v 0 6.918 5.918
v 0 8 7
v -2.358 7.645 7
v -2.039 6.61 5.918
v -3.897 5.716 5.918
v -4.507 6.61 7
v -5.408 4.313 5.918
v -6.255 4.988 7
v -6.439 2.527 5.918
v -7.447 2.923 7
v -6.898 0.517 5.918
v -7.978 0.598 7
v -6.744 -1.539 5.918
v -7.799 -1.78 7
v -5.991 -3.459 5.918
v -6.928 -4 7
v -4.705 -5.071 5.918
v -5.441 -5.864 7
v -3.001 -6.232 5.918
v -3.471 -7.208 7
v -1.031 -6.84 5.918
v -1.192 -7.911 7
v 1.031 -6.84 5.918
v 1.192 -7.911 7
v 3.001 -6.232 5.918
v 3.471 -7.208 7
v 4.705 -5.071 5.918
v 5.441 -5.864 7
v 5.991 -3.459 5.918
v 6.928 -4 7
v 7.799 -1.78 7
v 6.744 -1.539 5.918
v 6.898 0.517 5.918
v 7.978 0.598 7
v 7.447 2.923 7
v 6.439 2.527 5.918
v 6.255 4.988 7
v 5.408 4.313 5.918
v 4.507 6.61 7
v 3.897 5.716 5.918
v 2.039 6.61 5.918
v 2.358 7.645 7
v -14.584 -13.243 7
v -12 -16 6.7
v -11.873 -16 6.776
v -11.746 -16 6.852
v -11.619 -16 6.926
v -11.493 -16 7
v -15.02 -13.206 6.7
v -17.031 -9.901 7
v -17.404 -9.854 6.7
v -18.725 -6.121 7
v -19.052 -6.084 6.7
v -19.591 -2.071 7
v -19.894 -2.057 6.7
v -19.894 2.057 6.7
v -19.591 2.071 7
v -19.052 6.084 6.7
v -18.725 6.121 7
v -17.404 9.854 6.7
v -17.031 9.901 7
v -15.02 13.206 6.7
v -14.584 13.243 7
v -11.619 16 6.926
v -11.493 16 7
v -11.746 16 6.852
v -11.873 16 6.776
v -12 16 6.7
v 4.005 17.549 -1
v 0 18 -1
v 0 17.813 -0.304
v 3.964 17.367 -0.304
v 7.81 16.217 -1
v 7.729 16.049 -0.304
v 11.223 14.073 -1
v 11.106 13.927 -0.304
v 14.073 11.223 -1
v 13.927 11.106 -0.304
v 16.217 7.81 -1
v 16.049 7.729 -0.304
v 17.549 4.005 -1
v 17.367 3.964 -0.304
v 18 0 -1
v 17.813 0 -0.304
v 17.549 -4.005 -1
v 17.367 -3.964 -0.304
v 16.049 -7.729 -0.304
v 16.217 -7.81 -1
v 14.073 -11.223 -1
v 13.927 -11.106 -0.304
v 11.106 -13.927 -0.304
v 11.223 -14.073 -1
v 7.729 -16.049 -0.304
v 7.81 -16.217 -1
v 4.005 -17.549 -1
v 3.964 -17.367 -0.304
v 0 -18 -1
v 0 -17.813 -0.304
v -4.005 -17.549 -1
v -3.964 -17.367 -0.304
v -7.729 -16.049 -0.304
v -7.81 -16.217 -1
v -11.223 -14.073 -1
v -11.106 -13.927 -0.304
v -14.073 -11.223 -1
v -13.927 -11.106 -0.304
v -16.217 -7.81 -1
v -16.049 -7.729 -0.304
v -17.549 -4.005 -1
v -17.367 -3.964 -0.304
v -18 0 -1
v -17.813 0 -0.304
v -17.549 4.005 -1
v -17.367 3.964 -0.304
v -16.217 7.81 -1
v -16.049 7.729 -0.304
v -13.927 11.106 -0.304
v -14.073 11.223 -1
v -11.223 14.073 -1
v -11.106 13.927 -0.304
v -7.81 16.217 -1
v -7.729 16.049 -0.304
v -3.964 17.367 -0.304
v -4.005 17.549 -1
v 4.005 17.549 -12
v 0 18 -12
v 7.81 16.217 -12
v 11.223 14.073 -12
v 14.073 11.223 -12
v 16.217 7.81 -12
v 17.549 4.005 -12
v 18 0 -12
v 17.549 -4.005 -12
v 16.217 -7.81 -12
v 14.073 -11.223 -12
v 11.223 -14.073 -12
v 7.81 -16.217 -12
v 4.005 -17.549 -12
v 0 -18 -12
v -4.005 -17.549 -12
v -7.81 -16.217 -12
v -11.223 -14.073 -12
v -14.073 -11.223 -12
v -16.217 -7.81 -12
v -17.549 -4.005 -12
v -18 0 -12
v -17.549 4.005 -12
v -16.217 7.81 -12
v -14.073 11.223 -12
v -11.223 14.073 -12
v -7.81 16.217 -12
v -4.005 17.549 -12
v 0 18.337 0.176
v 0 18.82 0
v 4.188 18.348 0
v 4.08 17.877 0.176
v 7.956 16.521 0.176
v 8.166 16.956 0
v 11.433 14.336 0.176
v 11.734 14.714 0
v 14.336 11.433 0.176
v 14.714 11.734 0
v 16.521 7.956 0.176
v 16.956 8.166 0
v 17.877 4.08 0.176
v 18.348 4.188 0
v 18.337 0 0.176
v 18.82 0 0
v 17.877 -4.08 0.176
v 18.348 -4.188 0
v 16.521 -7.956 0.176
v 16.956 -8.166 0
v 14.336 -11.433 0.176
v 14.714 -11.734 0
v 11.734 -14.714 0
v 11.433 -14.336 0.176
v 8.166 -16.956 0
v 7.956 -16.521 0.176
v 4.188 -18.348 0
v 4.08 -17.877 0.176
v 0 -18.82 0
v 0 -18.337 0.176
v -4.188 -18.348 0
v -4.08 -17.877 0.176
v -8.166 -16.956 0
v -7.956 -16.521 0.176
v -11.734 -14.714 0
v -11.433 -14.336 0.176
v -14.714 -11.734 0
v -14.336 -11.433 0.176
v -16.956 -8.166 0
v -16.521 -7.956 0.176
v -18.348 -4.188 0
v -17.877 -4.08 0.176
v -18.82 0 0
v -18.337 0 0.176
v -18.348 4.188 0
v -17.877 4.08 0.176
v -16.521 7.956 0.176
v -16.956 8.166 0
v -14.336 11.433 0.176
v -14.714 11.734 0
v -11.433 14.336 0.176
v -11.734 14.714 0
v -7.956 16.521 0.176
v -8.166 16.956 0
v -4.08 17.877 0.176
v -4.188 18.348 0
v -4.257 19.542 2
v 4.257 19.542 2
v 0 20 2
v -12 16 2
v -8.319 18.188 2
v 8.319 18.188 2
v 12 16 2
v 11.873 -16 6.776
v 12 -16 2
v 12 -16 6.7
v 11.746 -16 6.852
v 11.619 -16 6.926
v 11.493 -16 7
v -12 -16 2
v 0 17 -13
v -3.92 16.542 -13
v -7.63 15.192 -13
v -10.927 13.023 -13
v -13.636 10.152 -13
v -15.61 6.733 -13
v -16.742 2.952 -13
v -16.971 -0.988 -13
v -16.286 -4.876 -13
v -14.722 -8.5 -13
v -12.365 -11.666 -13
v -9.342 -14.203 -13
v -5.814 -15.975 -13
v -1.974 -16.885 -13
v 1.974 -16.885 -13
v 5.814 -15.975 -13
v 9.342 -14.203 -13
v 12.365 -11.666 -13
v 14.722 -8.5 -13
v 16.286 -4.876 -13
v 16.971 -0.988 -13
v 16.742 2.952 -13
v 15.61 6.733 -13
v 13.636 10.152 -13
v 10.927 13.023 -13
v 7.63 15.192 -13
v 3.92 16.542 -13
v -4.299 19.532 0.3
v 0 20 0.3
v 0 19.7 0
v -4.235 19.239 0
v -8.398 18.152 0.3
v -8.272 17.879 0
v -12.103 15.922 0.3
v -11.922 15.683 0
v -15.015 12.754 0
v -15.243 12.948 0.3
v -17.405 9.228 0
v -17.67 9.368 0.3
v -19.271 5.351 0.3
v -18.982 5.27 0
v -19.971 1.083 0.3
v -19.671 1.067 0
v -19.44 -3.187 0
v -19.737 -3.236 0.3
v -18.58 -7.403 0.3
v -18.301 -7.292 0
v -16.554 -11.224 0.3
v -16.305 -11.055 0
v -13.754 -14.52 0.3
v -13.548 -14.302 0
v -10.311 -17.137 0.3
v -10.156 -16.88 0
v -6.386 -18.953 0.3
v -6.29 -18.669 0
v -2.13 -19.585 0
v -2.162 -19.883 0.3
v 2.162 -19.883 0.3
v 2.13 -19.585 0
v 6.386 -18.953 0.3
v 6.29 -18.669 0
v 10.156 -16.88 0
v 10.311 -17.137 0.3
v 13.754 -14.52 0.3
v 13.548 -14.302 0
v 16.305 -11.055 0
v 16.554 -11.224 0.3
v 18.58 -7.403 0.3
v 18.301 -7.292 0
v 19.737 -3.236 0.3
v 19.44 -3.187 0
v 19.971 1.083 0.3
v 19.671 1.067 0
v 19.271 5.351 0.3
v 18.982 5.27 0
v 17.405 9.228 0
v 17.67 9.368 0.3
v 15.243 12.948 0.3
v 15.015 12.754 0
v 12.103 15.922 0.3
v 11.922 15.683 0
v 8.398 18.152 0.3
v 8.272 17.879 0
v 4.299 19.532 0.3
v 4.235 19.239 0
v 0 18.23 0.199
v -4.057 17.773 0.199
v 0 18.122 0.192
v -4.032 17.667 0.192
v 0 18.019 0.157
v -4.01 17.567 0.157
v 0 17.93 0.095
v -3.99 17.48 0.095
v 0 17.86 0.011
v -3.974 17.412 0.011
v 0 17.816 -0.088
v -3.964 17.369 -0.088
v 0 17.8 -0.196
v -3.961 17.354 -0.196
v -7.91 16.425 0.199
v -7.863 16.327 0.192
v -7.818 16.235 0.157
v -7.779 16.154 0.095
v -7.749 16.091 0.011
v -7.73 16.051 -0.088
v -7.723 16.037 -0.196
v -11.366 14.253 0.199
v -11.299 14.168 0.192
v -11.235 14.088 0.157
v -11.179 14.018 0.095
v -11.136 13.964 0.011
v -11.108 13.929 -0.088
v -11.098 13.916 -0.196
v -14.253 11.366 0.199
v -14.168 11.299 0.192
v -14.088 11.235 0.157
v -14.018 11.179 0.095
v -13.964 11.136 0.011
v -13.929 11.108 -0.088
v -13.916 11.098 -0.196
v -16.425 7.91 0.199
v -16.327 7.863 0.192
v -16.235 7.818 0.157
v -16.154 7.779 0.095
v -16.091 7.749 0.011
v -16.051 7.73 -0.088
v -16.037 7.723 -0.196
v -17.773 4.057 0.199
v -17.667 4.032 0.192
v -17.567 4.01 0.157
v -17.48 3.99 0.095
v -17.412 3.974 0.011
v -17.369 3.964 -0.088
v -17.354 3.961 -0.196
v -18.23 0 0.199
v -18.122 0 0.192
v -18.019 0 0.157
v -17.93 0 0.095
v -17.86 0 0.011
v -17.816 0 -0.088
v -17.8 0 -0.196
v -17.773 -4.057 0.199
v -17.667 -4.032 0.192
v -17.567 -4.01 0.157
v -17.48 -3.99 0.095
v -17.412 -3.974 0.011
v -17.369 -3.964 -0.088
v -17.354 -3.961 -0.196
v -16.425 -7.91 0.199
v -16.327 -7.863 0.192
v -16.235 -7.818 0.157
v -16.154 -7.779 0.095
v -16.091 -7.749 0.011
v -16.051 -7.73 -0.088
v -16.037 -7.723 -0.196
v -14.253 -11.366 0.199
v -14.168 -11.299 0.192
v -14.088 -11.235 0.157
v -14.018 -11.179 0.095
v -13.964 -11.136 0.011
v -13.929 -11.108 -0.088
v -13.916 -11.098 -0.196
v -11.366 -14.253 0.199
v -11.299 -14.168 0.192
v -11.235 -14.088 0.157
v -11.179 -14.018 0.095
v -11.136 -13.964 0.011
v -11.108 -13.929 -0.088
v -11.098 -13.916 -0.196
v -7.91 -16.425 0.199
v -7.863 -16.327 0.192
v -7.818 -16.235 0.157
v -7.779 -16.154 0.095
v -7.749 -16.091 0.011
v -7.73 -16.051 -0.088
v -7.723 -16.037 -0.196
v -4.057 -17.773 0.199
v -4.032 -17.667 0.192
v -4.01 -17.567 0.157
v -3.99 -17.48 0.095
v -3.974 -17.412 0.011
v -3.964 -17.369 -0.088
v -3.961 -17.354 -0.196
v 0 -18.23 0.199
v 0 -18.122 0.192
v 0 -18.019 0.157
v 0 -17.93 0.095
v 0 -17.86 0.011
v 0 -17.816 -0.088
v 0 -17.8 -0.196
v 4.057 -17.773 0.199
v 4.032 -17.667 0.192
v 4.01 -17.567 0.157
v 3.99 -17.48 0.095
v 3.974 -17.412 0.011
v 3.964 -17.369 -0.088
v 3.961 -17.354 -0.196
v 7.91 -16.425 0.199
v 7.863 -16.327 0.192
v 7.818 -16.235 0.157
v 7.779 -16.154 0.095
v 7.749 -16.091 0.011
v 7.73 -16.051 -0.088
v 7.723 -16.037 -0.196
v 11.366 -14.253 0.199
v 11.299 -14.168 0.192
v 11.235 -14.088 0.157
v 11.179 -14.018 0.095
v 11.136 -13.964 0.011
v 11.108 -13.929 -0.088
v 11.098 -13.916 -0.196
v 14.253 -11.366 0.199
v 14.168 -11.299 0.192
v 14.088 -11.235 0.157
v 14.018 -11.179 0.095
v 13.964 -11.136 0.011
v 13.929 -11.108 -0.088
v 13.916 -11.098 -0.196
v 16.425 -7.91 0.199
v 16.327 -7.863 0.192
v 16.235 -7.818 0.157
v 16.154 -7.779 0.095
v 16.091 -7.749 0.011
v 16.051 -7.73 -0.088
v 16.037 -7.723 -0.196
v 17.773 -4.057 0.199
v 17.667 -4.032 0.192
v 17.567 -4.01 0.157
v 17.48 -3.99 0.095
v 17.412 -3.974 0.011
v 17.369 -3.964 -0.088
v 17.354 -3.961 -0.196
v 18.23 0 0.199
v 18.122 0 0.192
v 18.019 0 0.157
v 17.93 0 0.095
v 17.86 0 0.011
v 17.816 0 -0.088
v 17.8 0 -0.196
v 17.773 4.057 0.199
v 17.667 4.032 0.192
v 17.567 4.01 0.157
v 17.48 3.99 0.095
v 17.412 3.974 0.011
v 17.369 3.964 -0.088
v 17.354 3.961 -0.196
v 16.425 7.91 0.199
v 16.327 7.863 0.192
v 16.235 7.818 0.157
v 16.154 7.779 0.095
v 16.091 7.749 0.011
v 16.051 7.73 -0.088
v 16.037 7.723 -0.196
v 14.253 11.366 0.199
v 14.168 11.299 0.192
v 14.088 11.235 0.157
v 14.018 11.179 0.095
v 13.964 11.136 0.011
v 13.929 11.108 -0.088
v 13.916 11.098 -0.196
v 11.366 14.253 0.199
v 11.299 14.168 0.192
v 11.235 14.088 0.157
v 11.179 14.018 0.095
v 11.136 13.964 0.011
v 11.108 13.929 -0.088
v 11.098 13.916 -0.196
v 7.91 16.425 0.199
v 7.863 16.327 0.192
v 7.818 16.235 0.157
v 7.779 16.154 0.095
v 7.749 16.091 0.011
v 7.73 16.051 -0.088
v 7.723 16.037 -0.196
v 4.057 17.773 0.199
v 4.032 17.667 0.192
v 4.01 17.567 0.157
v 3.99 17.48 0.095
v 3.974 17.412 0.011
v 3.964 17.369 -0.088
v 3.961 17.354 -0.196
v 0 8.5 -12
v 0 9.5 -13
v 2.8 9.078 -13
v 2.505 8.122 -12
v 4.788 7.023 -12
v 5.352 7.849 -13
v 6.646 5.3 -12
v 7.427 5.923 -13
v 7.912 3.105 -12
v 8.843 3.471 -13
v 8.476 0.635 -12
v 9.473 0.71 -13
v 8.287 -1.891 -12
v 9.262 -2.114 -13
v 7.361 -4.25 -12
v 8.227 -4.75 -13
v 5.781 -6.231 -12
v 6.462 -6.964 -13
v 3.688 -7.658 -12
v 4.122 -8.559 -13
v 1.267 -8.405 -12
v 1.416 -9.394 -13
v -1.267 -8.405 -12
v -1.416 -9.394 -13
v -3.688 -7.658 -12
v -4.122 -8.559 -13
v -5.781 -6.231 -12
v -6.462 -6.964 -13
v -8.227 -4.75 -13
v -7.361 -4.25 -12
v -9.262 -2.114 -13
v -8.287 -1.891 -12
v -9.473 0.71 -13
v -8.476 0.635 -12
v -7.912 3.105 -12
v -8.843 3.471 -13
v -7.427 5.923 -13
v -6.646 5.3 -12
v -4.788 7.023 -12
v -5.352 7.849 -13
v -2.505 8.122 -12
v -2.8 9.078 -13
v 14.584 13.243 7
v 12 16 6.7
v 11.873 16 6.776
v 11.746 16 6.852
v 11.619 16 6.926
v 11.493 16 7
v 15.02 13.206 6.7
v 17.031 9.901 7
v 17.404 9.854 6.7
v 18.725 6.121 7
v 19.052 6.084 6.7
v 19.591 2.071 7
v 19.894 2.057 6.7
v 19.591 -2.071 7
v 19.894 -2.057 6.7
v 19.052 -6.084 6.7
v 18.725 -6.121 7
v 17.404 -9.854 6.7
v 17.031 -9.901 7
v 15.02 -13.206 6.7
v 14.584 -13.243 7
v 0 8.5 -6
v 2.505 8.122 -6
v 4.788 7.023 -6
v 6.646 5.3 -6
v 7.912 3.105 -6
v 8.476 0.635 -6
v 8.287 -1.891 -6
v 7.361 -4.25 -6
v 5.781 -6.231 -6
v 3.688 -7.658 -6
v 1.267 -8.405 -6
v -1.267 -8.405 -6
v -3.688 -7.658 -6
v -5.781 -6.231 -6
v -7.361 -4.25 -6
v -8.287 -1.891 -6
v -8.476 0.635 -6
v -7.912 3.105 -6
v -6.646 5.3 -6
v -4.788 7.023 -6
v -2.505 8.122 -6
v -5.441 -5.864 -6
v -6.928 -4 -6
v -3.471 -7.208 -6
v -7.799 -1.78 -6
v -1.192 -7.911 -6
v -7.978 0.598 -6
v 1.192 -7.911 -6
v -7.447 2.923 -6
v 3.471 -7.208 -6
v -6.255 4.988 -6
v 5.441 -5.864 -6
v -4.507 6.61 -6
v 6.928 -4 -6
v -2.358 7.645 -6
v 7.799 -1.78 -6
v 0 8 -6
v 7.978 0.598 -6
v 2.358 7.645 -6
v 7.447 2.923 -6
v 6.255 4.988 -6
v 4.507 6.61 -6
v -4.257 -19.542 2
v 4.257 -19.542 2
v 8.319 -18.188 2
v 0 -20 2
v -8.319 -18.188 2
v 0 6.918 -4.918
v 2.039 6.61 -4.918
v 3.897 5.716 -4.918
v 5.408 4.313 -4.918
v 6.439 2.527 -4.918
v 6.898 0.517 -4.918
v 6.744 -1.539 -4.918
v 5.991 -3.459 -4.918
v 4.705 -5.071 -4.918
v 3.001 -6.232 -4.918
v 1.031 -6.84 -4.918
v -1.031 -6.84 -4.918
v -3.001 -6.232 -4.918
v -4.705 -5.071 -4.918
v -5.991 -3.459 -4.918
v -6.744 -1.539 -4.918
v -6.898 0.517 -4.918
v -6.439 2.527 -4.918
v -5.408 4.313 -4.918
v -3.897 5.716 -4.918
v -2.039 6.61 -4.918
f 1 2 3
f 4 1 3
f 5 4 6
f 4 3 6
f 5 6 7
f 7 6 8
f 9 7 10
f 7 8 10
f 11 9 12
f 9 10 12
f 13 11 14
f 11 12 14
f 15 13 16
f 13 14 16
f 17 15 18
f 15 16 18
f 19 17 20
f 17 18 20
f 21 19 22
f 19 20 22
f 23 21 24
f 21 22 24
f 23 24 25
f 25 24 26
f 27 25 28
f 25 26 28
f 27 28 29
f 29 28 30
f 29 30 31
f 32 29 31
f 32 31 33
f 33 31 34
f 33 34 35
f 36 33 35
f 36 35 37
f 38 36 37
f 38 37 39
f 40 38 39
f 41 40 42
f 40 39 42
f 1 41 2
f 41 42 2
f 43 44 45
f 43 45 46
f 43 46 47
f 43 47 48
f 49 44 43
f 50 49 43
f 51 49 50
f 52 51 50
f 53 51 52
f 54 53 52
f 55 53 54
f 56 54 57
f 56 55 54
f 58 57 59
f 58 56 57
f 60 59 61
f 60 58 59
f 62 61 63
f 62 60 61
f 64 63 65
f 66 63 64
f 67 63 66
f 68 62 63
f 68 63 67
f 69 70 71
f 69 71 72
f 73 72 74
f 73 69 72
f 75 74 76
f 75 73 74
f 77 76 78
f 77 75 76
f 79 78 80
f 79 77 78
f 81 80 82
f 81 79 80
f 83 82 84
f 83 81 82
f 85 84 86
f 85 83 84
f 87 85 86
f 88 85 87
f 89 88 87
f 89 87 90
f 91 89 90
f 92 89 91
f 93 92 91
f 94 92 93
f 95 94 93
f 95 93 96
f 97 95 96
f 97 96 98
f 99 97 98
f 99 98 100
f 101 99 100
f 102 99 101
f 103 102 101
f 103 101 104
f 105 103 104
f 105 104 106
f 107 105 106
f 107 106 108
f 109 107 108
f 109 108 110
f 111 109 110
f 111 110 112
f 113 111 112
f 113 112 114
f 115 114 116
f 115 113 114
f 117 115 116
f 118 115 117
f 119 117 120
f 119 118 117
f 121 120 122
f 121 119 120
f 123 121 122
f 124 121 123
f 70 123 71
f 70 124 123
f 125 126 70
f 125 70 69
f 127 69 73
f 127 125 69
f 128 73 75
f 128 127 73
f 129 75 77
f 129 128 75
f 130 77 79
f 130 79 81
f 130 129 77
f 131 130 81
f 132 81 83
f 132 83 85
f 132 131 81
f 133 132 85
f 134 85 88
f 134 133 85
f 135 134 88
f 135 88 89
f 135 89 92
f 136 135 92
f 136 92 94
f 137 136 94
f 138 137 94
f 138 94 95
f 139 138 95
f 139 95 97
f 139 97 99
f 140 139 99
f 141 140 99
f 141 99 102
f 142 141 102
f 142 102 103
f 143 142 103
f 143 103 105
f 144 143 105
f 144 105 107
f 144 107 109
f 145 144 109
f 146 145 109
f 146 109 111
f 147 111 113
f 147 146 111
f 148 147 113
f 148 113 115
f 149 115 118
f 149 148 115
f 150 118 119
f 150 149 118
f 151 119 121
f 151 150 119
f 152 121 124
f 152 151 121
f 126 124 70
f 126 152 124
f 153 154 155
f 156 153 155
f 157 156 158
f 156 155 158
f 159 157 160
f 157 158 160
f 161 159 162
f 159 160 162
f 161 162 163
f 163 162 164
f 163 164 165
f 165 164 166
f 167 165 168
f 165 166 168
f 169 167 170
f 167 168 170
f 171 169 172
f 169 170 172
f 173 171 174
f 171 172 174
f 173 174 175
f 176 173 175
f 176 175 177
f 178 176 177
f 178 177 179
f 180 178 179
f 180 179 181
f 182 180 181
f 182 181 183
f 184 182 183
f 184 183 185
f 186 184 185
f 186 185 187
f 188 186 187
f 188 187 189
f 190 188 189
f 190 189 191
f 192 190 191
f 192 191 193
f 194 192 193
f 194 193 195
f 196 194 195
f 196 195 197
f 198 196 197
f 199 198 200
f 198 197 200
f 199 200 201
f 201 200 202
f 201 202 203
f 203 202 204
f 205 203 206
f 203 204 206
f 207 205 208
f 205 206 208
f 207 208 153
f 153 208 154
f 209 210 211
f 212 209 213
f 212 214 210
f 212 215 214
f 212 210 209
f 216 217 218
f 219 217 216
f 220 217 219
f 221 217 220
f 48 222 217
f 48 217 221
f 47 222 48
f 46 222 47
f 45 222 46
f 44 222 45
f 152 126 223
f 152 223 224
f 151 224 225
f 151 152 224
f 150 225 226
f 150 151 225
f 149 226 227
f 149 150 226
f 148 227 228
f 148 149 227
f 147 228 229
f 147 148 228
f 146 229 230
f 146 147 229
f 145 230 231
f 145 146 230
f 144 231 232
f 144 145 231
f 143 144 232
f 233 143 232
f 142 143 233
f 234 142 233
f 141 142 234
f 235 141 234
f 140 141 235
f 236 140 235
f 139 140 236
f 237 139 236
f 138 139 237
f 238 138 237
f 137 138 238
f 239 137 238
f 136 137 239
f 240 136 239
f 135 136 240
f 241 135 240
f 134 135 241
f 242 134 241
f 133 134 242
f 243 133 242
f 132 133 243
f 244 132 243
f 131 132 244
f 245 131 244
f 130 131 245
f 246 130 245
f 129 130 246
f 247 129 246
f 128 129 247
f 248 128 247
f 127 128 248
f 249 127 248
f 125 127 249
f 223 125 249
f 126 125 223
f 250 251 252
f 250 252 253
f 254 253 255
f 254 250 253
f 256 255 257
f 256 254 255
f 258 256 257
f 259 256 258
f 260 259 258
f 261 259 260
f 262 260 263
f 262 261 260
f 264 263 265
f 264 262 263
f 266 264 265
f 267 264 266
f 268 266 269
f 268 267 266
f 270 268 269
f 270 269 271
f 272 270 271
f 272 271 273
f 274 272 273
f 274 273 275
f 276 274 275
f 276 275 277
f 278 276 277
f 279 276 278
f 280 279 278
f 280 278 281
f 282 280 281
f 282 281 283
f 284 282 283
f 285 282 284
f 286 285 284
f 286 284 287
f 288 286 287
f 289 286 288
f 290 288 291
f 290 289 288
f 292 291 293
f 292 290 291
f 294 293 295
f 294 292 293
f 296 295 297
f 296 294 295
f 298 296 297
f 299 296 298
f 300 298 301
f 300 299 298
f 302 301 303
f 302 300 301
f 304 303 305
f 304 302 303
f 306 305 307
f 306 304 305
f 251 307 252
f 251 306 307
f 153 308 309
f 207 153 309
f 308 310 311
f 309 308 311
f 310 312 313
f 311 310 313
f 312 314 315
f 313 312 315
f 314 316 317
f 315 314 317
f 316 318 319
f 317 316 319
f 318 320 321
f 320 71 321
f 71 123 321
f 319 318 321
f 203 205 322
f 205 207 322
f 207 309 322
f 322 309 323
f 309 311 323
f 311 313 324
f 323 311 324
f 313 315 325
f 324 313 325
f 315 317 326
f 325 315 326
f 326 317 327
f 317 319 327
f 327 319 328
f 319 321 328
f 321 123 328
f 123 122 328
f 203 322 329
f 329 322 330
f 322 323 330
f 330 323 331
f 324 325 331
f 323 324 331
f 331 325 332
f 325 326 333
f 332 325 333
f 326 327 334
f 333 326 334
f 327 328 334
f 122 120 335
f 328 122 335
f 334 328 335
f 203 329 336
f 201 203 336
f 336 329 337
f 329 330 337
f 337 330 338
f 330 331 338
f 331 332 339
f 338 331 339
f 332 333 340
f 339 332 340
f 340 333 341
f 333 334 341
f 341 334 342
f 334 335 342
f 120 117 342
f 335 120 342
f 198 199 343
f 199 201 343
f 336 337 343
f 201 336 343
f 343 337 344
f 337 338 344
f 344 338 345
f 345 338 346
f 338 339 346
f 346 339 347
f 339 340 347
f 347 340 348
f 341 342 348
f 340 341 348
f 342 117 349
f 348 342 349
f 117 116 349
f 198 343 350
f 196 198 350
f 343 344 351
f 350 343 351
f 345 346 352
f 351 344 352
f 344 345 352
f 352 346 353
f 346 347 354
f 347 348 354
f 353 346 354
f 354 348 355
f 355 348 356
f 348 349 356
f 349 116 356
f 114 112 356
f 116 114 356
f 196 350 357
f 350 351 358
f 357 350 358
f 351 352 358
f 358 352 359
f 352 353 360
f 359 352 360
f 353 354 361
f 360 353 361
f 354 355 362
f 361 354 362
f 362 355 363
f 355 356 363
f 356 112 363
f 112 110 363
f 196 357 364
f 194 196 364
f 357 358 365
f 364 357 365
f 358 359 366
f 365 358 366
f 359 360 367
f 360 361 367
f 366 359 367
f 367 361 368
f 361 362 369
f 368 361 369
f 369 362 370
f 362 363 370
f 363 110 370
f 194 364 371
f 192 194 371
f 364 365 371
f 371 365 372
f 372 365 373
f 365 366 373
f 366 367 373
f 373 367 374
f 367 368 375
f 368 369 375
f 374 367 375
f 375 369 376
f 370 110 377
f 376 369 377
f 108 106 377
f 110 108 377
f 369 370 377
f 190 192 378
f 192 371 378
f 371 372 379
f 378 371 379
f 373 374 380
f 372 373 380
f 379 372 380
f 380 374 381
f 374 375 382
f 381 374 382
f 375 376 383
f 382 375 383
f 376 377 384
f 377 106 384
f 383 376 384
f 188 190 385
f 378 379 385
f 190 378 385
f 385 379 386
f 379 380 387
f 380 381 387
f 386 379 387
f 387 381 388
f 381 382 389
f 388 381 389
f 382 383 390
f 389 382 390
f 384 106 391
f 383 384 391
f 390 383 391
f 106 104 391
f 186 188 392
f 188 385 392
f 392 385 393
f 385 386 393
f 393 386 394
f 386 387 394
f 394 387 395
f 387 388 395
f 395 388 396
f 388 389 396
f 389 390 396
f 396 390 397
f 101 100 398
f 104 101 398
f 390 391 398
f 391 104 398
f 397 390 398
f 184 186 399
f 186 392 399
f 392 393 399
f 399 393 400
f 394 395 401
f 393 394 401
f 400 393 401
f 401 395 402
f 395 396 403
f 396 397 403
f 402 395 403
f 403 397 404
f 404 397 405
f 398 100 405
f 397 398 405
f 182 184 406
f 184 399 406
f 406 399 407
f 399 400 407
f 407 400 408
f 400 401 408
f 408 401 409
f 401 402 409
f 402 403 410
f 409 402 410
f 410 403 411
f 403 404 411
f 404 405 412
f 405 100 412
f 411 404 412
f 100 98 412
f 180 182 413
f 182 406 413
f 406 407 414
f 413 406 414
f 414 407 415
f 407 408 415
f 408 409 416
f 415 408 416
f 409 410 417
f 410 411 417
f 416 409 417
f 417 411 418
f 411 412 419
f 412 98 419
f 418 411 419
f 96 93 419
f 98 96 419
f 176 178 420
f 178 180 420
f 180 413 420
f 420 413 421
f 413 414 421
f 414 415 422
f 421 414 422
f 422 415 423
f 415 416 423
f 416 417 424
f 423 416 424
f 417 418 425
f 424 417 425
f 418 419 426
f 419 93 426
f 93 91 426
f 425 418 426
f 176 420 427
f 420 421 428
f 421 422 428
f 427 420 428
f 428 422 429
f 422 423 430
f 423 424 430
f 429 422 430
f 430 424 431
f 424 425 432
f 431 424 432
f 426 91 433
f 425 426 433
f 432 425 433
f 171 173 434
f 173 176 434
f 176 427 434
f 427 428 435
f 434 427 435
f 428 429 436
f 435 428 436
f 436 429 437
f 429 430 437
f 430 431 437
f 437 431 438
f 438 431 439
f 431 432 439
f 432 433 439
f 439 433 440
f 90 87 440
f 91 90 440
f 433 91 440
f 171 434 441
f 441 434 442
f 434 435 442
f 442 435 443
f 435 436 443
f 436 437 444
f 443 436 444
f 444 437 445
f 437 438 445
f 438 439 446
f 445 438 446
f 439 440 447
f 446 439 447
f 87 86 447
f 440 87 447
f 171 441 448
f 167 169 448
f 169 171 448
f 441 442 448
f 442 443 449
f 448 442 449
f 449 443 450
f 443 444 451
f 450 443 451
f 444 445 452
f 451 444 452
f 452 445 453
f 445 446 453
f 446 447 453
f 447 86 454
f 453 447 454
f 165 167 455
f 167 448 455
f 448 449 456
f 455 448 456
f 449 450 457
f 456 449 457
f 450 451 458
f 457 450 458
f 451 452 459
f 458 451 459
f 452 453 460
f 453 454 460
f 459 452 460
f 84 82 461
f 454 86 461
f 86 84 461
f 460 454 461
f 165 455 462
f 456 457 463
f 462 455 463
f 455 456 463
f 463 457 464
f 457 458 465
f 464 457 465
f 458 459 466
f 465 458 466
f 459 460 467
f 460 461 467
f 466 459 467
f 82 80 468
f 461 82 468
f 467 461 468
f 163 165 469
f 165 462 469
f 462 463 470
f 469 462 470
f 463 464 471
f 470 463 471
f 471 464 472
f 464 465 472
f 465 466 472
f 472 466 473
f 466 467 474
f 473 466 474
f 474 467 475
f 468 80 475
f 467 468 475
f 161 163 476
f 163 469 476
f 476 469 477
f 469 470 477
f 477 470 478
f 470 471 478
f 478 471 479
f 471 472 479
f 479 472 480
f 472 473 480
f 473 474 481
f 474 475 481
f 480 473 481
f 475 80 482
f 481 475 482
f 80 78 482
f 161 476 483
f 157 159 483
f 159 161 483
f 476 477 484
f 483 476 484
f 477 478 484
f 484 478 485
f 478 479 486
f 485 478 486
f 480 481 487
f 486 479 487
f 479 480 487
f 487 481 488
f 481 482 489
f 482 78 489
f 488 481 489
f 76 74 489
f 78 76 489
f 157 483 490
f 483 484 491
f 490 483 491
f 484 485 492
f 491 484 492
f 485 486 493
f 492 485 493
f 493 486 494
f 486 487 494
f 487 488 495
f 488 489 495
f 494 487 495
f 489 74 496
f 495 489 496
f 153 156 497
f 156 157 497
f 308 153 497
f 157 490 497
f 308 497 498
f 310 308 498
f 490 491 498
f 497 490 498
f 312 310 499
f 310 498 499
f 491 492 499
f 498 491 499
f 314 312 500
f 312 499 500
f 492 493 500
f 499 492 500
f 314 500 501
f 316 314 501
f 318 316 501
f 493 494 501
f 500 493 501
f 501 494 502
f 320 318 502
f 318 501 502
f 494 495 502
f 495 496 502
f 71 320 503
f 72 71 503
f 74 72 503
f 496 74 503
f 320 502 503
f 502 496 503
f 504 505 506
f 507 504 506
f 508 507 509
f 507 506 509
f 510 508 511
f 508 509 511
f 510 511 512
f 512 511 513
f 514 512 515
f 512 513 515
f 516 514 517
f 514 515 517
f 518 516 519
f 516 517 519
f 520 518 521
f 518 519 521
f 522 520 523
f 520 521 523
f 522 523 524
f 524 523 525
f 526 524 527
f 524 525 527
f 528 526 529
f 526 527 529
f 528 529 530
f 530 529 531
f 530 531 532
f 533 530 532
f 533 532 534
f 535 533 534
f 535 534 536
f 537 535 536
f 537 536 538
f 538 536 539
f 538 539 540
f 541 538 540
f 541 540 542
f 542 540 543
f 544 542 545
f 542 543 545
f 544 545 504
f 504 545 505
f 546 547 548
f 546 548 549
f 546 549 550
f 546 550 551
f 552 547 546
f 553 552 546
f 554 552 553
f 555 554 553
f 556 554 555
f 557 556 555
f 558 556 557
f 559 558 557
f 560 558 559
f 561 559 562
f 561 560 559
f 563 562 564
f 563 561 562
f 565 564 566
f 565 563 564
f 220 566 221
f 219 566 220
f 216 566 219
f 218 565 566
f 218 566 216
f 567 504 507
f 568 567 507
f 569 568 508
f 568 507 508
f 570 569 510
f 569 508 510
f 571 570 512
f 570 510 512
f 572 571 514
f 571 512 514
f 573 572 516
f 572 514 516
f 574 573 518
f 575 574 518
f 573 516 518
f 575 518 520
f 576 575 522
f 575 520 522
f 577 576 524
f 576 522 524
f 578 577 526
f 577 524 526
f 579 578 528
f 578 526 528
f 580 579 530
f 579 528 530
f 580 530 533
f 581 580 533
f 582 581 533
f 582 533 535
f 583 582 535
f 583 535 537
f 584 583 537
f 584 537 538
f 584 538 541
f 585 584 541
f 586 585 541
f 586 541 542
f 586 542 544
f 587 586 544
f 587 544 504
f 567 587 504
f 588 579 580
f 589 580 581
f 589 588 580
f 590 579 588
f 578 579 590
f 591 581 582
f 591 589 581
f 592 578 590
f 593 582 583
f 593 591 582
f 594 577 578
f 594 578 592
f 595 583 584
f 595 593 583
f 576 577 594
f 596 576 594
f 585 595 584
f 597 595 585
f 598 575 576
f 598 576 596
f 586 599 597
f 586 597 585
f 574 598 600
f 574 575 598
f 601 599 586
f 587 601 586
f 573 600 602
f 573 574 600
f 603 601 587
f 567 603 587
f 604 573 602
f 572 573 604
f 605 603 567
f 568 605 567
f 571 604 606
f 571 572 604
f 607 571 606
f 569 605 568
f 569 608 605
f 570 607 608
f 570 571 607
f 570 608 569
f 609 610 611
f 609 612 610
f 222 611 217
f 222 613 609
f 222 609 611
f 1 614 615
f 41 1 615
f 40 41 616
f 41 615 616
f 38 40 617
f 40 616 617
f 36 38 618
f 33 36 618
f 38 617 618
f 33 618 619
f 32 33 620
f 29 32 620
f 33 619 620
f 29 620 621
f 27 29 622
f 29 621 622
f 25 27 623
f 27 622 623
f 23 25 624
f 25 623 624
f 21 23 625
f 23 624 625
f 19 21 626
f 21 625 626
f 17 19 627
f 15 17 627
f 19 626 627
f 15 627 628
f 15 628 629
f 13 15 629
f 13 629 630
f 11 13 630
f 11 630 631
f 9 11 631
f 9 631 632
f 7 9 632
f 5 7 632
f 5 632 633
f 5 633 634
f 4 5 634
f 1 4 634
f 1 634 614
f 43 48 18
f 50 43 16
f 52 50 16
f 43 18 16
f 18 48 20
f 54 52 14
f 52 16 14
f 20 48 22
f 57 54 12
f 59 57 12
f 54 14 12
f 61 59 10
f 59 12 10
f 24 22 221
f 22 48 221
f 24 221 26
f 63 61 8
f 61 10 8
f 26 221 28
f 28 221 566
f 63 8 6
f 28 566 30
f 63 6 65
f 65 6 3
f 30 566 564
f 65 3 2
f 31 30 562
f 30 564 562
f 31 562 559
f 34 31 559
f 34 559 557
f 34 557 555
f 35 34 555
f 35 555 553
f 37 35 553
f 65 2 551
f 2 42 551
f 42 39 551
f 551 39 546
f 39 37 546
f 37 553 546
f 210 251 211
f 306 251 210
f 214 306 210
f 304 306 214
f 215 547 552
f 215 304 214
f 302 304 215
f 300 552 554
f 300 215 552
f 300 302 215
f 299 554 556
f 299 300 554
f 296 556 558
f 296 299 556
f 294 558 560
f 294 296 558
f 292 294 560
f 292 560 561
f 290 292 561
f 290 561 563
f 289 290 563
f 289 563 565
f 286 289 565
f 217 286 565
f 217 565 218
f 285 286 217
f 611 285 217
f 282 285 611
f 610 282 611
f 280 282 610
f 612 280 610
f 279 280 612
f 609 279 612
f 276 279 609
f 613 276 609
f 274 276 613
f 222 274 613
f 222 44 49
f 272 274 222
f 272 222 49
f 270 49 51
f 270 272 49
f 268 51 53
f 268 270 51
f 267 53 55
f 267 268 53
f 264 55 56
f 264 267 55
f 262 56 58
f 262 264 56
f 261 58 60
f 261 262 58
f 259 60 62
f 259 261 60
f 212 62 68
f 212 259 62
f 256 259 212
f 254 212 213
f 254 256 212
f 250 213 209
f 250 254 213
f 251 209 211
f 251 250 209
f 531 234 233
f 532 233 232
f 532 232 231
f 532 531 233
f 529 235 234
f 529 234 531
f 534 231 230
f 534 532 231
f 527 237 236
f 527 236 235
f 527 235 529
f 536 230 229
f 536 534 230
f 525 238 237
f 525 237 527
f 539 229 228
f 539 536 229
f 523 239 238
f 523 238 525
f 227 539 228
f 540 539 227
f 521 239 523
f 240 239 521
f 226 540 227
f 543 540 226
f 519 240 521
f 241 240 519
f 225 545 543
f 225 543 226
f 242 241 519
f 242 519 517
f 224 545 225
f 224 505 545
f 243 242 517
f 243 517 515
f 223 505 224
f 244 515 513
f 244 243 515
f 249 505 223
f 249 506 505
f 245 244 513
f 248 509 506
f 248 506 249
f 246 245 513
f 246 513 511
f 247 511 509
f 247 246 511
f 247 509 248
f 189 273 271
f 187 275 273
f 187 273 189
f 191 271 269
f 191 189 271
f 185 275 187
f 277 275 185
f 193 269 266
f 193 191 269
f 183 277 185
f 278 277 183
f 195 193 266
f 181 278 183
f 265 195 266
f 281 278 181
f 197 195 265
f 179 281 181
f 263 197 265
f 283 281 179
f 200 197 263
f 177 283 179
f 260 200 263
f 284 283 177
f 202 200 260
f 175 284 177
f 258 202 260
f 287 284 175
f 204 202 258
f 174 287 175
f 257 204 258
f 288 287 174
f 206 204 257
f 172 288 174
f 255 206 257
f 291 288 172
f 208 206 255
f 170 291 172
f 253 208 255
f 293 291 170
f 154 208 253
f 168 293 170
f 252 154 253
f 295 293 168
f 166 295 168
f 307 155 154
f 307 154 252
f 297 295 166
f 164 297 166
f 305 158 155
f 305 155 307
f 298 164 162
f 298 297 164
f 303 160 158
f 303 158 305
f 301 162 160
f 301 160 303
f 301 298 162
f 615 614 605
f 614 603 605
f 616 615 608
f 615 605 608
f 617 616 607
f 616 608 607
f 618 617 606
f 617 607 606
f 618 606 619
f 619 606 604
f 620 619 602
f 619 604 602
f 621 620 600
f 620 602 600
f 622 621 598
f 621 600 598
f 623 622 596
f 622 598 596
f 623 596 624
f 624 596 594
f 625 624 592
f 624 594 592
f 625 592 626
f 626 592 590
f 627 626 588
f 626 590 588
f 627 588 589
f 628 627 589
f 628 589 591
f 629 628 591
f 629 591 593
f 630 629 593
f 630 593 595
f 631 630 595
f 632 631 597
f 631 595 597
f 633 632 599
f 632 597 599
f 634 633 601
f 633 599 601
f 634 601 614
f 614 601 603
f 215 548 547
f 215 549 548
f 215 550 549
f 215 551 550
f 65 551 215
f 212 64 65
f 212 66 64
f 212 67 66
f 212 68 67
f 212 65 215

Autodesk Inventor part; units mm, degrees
sketch "Sketch_3" plane through (0, 0, 0) normal (1, 0, 0) x (0, 0, -1)
  line L0 (13, 0) -> (-7, 0)
  line L1 (-7, 0) -> (-7, 19.7)
  line L2 (-7, 19.7) -> (-6.7, 20)
  line L3 (-6.7, 20) -> (-0.3, 20)
  line L4 (-0.3, 20) -> (0, 19.7)
  line L5 (0, 19.7) -> (0, 18.8198)
  line L6 (0, 18.8198) -> (-0.1759, 18.3366)
  arc A0 (-0.1759, 18.3366) -> (0.3035, 17.8134) centre (0.2, 18.1998) ccw
  line L7 (0.3035, 17.8134) -> (1, 18)
  line L8 (1, 18) -> (12, 18)
  line L9 (12, 18) -> (13, 17)
  line L10 (13, 17) -> (13, 0)
  line L11 (13, 0) -> (-7, 0)
revolve "Revolution1" add sketch "Sketch_3" angle 360 about axis through (0, 0, -13) along (0, 0, -1)
sketch "Sketch_1" plane through (0, 0, 0) normal (1, 0, 0) x (0, 0, -1)
  line L0 (13, 0) -> (-7, 0)
  line L1 (-7, 0) -> (-7, 8)
  line L2 (-7, 8) -> (-5.9175, 6.9175)
  line L3 (-5.9175, 6.9175) -> (4.9175, 6.9175)
  line L4 (4.9175, 6.9175) -> (6, 8)
  line L5 (6, 8) -> (6, 8.5)
  line L6 (6, 8.5) -> (12, 8.5)
  line L7 (12, 8.5) -> (13, 9.5)
  line L8 (13, 9.5) -> (13, 0)
  line L9 (13, 0) -> (-7, 0)
revolve "Revolution2" cut sketch "Sketch_1" angle 360 about axis through (0, 0, -13) along (0, 0, -1)
thread "Thread1" size "M16x2" class "6H" standard "ISO Metric profile" full length
sketch "Sketch_6" plane through (0, 0, 0) normal (1, 0, 0) x (0, 0, -1)
  line L0 (-12, 25) -> (-12, -25)
  line L1 (-12, -25) -> (-2, -25)
  line L2 (-2, -25) -> (-2, -16)
  line L3 (-2, -16) -> (-7, -16)
  line L4 (-7, -16) -> (-7, 16)
  line L5 (-7, 16) -> (-2, 16)
  line L6 (-2, 16) -> (-2, 25)
  line L7 (-2, 25) -> (-12, 25)
extrude "Extrusion1" cut sketch "Sketch_6" along normal mid plane 50
ref_plane "BP_POSHUB_ME_XY" through (0, 0, 7) normal (0, 0, 1) x (1, 0, 0)
ref_plane "BP_POSHUB_ME_YZ" through (0, 0, 7) normal (1, 0, 0) x (0, 1, 0)
ref_plane "BP_POSHUB_ME_ZX" through (0, 0, 7) normal (0, 1, 0) x (0, 0, 1)
ref_plane "DP401_XY" through (0, -16, 7) normal (1, 0, 0) x (0, 0, -1)
ref_plane "DP401_YZ" through (0, -16, 7) normal (0, 0, -1) x (0, 1, 0)
ref_plane "DP401_ZX" through (0, -16, 7) normal (0, 1, 0) x (1, 0, 0)
ref_plane "DPF1_XY" through (0, 20, 2) normal (1, 0, 0) x (0, 0, -1)
ref_plane "DPF1_YZ" through (0, 20, 2) normal (0, 0, -1) x (0, 1, 0)
ref_plane "DPF1_ZX" through (0, 20, 2) normal (0, 1, 0) x (1, 0, 0)
ref_plane "DPF2_XY" through (0, -20, 2) normal (1, 0, 0) x (0, 0, -1)
ref_plane "DPF2_YZ" through (0, -20, 2) normal (0, 0, -1) x (0, 1, 0)
ref_plane "DPF2_ZX" through (0, -20, 2) normal (0, 1, 0) x (1, 0, 0)
ref_plane "DPM2_XY" through (0, 16, 7) normal (1, 0, 0) x (0, 0, -1)
ref_plane "DPM2_YZ" through (0, 16, 7) normal (0, 0, -1) x (0, 1, 0)
ref_plane "DPM2_ZX" through (0, 16, 7) normal (0, 1, 0) x (1, 0, 0)
ref_plane "DPX2_XY" through (0, -16, 7) normal (1, 0, 0) x (0, 0, -1)
ref_plane "DPX2_YZ" through (0, -16, 7) normal (0, 0, -1) x (0, 1, 0)
ref_plane "DPX2_ZX" through (0, -16, 7) normal (0, 1, 0) x (1, 0, 0)
ref_plane "MUTTER_XY" through (0, 0, 7) normal (0, 0, -1) x (1, 0, 0)
ref_plane "MUTTER_YZ" through (0, 0, 7) normal (1, 0, 0) x (0, -1, 0)
ref_plane "MUTTER_ZX" through (0, 0, 7) normal (0, -1, 0) x (0, 0, -1)
ref_plane "SCHRAUBE_XY" through (0, 0, -13) normal (0, 0, 1) x (1, 0, 0)
ref_plane "SCHRAUBE_YZ" through (0, 0, -13) normal (1, 0, 0) x (0, 1, 0)
ref_plane "SCHRAUBE_ZX" through (0, 0, -13) normal (0, 1, 0) x (0, 0, 1)
ref_plane "SCHUBSTANGE_XY" through (0, 0, 0) normal (0, 0, 1) x (1, 0, 0)
ref_plane "SCHUBSTANGE_YZ" through (0, 0, 0) normal (1, 0, 0) x (0, 1, 0)
ref_plane "SCHUBSTANGE_ZX" through (0, 0, 0) normal (0, 1, 0) x (0, 0, 1)
ref_plane "STOPFEN_XY" through (0, 0, 7) normal (0, 0, -1) x (1, 0, 0)
ref_plane "STOPFEN_YZ" through (0, 0, 7) normal (1, 0, 0) x (0, -1, 0)
ref_plane "STOPFEN_ZX" through (0, 0, 7) normal (0, -1, 0) x (0, 0, -1)
properties part number "SLZ_63_Stopfen#"
